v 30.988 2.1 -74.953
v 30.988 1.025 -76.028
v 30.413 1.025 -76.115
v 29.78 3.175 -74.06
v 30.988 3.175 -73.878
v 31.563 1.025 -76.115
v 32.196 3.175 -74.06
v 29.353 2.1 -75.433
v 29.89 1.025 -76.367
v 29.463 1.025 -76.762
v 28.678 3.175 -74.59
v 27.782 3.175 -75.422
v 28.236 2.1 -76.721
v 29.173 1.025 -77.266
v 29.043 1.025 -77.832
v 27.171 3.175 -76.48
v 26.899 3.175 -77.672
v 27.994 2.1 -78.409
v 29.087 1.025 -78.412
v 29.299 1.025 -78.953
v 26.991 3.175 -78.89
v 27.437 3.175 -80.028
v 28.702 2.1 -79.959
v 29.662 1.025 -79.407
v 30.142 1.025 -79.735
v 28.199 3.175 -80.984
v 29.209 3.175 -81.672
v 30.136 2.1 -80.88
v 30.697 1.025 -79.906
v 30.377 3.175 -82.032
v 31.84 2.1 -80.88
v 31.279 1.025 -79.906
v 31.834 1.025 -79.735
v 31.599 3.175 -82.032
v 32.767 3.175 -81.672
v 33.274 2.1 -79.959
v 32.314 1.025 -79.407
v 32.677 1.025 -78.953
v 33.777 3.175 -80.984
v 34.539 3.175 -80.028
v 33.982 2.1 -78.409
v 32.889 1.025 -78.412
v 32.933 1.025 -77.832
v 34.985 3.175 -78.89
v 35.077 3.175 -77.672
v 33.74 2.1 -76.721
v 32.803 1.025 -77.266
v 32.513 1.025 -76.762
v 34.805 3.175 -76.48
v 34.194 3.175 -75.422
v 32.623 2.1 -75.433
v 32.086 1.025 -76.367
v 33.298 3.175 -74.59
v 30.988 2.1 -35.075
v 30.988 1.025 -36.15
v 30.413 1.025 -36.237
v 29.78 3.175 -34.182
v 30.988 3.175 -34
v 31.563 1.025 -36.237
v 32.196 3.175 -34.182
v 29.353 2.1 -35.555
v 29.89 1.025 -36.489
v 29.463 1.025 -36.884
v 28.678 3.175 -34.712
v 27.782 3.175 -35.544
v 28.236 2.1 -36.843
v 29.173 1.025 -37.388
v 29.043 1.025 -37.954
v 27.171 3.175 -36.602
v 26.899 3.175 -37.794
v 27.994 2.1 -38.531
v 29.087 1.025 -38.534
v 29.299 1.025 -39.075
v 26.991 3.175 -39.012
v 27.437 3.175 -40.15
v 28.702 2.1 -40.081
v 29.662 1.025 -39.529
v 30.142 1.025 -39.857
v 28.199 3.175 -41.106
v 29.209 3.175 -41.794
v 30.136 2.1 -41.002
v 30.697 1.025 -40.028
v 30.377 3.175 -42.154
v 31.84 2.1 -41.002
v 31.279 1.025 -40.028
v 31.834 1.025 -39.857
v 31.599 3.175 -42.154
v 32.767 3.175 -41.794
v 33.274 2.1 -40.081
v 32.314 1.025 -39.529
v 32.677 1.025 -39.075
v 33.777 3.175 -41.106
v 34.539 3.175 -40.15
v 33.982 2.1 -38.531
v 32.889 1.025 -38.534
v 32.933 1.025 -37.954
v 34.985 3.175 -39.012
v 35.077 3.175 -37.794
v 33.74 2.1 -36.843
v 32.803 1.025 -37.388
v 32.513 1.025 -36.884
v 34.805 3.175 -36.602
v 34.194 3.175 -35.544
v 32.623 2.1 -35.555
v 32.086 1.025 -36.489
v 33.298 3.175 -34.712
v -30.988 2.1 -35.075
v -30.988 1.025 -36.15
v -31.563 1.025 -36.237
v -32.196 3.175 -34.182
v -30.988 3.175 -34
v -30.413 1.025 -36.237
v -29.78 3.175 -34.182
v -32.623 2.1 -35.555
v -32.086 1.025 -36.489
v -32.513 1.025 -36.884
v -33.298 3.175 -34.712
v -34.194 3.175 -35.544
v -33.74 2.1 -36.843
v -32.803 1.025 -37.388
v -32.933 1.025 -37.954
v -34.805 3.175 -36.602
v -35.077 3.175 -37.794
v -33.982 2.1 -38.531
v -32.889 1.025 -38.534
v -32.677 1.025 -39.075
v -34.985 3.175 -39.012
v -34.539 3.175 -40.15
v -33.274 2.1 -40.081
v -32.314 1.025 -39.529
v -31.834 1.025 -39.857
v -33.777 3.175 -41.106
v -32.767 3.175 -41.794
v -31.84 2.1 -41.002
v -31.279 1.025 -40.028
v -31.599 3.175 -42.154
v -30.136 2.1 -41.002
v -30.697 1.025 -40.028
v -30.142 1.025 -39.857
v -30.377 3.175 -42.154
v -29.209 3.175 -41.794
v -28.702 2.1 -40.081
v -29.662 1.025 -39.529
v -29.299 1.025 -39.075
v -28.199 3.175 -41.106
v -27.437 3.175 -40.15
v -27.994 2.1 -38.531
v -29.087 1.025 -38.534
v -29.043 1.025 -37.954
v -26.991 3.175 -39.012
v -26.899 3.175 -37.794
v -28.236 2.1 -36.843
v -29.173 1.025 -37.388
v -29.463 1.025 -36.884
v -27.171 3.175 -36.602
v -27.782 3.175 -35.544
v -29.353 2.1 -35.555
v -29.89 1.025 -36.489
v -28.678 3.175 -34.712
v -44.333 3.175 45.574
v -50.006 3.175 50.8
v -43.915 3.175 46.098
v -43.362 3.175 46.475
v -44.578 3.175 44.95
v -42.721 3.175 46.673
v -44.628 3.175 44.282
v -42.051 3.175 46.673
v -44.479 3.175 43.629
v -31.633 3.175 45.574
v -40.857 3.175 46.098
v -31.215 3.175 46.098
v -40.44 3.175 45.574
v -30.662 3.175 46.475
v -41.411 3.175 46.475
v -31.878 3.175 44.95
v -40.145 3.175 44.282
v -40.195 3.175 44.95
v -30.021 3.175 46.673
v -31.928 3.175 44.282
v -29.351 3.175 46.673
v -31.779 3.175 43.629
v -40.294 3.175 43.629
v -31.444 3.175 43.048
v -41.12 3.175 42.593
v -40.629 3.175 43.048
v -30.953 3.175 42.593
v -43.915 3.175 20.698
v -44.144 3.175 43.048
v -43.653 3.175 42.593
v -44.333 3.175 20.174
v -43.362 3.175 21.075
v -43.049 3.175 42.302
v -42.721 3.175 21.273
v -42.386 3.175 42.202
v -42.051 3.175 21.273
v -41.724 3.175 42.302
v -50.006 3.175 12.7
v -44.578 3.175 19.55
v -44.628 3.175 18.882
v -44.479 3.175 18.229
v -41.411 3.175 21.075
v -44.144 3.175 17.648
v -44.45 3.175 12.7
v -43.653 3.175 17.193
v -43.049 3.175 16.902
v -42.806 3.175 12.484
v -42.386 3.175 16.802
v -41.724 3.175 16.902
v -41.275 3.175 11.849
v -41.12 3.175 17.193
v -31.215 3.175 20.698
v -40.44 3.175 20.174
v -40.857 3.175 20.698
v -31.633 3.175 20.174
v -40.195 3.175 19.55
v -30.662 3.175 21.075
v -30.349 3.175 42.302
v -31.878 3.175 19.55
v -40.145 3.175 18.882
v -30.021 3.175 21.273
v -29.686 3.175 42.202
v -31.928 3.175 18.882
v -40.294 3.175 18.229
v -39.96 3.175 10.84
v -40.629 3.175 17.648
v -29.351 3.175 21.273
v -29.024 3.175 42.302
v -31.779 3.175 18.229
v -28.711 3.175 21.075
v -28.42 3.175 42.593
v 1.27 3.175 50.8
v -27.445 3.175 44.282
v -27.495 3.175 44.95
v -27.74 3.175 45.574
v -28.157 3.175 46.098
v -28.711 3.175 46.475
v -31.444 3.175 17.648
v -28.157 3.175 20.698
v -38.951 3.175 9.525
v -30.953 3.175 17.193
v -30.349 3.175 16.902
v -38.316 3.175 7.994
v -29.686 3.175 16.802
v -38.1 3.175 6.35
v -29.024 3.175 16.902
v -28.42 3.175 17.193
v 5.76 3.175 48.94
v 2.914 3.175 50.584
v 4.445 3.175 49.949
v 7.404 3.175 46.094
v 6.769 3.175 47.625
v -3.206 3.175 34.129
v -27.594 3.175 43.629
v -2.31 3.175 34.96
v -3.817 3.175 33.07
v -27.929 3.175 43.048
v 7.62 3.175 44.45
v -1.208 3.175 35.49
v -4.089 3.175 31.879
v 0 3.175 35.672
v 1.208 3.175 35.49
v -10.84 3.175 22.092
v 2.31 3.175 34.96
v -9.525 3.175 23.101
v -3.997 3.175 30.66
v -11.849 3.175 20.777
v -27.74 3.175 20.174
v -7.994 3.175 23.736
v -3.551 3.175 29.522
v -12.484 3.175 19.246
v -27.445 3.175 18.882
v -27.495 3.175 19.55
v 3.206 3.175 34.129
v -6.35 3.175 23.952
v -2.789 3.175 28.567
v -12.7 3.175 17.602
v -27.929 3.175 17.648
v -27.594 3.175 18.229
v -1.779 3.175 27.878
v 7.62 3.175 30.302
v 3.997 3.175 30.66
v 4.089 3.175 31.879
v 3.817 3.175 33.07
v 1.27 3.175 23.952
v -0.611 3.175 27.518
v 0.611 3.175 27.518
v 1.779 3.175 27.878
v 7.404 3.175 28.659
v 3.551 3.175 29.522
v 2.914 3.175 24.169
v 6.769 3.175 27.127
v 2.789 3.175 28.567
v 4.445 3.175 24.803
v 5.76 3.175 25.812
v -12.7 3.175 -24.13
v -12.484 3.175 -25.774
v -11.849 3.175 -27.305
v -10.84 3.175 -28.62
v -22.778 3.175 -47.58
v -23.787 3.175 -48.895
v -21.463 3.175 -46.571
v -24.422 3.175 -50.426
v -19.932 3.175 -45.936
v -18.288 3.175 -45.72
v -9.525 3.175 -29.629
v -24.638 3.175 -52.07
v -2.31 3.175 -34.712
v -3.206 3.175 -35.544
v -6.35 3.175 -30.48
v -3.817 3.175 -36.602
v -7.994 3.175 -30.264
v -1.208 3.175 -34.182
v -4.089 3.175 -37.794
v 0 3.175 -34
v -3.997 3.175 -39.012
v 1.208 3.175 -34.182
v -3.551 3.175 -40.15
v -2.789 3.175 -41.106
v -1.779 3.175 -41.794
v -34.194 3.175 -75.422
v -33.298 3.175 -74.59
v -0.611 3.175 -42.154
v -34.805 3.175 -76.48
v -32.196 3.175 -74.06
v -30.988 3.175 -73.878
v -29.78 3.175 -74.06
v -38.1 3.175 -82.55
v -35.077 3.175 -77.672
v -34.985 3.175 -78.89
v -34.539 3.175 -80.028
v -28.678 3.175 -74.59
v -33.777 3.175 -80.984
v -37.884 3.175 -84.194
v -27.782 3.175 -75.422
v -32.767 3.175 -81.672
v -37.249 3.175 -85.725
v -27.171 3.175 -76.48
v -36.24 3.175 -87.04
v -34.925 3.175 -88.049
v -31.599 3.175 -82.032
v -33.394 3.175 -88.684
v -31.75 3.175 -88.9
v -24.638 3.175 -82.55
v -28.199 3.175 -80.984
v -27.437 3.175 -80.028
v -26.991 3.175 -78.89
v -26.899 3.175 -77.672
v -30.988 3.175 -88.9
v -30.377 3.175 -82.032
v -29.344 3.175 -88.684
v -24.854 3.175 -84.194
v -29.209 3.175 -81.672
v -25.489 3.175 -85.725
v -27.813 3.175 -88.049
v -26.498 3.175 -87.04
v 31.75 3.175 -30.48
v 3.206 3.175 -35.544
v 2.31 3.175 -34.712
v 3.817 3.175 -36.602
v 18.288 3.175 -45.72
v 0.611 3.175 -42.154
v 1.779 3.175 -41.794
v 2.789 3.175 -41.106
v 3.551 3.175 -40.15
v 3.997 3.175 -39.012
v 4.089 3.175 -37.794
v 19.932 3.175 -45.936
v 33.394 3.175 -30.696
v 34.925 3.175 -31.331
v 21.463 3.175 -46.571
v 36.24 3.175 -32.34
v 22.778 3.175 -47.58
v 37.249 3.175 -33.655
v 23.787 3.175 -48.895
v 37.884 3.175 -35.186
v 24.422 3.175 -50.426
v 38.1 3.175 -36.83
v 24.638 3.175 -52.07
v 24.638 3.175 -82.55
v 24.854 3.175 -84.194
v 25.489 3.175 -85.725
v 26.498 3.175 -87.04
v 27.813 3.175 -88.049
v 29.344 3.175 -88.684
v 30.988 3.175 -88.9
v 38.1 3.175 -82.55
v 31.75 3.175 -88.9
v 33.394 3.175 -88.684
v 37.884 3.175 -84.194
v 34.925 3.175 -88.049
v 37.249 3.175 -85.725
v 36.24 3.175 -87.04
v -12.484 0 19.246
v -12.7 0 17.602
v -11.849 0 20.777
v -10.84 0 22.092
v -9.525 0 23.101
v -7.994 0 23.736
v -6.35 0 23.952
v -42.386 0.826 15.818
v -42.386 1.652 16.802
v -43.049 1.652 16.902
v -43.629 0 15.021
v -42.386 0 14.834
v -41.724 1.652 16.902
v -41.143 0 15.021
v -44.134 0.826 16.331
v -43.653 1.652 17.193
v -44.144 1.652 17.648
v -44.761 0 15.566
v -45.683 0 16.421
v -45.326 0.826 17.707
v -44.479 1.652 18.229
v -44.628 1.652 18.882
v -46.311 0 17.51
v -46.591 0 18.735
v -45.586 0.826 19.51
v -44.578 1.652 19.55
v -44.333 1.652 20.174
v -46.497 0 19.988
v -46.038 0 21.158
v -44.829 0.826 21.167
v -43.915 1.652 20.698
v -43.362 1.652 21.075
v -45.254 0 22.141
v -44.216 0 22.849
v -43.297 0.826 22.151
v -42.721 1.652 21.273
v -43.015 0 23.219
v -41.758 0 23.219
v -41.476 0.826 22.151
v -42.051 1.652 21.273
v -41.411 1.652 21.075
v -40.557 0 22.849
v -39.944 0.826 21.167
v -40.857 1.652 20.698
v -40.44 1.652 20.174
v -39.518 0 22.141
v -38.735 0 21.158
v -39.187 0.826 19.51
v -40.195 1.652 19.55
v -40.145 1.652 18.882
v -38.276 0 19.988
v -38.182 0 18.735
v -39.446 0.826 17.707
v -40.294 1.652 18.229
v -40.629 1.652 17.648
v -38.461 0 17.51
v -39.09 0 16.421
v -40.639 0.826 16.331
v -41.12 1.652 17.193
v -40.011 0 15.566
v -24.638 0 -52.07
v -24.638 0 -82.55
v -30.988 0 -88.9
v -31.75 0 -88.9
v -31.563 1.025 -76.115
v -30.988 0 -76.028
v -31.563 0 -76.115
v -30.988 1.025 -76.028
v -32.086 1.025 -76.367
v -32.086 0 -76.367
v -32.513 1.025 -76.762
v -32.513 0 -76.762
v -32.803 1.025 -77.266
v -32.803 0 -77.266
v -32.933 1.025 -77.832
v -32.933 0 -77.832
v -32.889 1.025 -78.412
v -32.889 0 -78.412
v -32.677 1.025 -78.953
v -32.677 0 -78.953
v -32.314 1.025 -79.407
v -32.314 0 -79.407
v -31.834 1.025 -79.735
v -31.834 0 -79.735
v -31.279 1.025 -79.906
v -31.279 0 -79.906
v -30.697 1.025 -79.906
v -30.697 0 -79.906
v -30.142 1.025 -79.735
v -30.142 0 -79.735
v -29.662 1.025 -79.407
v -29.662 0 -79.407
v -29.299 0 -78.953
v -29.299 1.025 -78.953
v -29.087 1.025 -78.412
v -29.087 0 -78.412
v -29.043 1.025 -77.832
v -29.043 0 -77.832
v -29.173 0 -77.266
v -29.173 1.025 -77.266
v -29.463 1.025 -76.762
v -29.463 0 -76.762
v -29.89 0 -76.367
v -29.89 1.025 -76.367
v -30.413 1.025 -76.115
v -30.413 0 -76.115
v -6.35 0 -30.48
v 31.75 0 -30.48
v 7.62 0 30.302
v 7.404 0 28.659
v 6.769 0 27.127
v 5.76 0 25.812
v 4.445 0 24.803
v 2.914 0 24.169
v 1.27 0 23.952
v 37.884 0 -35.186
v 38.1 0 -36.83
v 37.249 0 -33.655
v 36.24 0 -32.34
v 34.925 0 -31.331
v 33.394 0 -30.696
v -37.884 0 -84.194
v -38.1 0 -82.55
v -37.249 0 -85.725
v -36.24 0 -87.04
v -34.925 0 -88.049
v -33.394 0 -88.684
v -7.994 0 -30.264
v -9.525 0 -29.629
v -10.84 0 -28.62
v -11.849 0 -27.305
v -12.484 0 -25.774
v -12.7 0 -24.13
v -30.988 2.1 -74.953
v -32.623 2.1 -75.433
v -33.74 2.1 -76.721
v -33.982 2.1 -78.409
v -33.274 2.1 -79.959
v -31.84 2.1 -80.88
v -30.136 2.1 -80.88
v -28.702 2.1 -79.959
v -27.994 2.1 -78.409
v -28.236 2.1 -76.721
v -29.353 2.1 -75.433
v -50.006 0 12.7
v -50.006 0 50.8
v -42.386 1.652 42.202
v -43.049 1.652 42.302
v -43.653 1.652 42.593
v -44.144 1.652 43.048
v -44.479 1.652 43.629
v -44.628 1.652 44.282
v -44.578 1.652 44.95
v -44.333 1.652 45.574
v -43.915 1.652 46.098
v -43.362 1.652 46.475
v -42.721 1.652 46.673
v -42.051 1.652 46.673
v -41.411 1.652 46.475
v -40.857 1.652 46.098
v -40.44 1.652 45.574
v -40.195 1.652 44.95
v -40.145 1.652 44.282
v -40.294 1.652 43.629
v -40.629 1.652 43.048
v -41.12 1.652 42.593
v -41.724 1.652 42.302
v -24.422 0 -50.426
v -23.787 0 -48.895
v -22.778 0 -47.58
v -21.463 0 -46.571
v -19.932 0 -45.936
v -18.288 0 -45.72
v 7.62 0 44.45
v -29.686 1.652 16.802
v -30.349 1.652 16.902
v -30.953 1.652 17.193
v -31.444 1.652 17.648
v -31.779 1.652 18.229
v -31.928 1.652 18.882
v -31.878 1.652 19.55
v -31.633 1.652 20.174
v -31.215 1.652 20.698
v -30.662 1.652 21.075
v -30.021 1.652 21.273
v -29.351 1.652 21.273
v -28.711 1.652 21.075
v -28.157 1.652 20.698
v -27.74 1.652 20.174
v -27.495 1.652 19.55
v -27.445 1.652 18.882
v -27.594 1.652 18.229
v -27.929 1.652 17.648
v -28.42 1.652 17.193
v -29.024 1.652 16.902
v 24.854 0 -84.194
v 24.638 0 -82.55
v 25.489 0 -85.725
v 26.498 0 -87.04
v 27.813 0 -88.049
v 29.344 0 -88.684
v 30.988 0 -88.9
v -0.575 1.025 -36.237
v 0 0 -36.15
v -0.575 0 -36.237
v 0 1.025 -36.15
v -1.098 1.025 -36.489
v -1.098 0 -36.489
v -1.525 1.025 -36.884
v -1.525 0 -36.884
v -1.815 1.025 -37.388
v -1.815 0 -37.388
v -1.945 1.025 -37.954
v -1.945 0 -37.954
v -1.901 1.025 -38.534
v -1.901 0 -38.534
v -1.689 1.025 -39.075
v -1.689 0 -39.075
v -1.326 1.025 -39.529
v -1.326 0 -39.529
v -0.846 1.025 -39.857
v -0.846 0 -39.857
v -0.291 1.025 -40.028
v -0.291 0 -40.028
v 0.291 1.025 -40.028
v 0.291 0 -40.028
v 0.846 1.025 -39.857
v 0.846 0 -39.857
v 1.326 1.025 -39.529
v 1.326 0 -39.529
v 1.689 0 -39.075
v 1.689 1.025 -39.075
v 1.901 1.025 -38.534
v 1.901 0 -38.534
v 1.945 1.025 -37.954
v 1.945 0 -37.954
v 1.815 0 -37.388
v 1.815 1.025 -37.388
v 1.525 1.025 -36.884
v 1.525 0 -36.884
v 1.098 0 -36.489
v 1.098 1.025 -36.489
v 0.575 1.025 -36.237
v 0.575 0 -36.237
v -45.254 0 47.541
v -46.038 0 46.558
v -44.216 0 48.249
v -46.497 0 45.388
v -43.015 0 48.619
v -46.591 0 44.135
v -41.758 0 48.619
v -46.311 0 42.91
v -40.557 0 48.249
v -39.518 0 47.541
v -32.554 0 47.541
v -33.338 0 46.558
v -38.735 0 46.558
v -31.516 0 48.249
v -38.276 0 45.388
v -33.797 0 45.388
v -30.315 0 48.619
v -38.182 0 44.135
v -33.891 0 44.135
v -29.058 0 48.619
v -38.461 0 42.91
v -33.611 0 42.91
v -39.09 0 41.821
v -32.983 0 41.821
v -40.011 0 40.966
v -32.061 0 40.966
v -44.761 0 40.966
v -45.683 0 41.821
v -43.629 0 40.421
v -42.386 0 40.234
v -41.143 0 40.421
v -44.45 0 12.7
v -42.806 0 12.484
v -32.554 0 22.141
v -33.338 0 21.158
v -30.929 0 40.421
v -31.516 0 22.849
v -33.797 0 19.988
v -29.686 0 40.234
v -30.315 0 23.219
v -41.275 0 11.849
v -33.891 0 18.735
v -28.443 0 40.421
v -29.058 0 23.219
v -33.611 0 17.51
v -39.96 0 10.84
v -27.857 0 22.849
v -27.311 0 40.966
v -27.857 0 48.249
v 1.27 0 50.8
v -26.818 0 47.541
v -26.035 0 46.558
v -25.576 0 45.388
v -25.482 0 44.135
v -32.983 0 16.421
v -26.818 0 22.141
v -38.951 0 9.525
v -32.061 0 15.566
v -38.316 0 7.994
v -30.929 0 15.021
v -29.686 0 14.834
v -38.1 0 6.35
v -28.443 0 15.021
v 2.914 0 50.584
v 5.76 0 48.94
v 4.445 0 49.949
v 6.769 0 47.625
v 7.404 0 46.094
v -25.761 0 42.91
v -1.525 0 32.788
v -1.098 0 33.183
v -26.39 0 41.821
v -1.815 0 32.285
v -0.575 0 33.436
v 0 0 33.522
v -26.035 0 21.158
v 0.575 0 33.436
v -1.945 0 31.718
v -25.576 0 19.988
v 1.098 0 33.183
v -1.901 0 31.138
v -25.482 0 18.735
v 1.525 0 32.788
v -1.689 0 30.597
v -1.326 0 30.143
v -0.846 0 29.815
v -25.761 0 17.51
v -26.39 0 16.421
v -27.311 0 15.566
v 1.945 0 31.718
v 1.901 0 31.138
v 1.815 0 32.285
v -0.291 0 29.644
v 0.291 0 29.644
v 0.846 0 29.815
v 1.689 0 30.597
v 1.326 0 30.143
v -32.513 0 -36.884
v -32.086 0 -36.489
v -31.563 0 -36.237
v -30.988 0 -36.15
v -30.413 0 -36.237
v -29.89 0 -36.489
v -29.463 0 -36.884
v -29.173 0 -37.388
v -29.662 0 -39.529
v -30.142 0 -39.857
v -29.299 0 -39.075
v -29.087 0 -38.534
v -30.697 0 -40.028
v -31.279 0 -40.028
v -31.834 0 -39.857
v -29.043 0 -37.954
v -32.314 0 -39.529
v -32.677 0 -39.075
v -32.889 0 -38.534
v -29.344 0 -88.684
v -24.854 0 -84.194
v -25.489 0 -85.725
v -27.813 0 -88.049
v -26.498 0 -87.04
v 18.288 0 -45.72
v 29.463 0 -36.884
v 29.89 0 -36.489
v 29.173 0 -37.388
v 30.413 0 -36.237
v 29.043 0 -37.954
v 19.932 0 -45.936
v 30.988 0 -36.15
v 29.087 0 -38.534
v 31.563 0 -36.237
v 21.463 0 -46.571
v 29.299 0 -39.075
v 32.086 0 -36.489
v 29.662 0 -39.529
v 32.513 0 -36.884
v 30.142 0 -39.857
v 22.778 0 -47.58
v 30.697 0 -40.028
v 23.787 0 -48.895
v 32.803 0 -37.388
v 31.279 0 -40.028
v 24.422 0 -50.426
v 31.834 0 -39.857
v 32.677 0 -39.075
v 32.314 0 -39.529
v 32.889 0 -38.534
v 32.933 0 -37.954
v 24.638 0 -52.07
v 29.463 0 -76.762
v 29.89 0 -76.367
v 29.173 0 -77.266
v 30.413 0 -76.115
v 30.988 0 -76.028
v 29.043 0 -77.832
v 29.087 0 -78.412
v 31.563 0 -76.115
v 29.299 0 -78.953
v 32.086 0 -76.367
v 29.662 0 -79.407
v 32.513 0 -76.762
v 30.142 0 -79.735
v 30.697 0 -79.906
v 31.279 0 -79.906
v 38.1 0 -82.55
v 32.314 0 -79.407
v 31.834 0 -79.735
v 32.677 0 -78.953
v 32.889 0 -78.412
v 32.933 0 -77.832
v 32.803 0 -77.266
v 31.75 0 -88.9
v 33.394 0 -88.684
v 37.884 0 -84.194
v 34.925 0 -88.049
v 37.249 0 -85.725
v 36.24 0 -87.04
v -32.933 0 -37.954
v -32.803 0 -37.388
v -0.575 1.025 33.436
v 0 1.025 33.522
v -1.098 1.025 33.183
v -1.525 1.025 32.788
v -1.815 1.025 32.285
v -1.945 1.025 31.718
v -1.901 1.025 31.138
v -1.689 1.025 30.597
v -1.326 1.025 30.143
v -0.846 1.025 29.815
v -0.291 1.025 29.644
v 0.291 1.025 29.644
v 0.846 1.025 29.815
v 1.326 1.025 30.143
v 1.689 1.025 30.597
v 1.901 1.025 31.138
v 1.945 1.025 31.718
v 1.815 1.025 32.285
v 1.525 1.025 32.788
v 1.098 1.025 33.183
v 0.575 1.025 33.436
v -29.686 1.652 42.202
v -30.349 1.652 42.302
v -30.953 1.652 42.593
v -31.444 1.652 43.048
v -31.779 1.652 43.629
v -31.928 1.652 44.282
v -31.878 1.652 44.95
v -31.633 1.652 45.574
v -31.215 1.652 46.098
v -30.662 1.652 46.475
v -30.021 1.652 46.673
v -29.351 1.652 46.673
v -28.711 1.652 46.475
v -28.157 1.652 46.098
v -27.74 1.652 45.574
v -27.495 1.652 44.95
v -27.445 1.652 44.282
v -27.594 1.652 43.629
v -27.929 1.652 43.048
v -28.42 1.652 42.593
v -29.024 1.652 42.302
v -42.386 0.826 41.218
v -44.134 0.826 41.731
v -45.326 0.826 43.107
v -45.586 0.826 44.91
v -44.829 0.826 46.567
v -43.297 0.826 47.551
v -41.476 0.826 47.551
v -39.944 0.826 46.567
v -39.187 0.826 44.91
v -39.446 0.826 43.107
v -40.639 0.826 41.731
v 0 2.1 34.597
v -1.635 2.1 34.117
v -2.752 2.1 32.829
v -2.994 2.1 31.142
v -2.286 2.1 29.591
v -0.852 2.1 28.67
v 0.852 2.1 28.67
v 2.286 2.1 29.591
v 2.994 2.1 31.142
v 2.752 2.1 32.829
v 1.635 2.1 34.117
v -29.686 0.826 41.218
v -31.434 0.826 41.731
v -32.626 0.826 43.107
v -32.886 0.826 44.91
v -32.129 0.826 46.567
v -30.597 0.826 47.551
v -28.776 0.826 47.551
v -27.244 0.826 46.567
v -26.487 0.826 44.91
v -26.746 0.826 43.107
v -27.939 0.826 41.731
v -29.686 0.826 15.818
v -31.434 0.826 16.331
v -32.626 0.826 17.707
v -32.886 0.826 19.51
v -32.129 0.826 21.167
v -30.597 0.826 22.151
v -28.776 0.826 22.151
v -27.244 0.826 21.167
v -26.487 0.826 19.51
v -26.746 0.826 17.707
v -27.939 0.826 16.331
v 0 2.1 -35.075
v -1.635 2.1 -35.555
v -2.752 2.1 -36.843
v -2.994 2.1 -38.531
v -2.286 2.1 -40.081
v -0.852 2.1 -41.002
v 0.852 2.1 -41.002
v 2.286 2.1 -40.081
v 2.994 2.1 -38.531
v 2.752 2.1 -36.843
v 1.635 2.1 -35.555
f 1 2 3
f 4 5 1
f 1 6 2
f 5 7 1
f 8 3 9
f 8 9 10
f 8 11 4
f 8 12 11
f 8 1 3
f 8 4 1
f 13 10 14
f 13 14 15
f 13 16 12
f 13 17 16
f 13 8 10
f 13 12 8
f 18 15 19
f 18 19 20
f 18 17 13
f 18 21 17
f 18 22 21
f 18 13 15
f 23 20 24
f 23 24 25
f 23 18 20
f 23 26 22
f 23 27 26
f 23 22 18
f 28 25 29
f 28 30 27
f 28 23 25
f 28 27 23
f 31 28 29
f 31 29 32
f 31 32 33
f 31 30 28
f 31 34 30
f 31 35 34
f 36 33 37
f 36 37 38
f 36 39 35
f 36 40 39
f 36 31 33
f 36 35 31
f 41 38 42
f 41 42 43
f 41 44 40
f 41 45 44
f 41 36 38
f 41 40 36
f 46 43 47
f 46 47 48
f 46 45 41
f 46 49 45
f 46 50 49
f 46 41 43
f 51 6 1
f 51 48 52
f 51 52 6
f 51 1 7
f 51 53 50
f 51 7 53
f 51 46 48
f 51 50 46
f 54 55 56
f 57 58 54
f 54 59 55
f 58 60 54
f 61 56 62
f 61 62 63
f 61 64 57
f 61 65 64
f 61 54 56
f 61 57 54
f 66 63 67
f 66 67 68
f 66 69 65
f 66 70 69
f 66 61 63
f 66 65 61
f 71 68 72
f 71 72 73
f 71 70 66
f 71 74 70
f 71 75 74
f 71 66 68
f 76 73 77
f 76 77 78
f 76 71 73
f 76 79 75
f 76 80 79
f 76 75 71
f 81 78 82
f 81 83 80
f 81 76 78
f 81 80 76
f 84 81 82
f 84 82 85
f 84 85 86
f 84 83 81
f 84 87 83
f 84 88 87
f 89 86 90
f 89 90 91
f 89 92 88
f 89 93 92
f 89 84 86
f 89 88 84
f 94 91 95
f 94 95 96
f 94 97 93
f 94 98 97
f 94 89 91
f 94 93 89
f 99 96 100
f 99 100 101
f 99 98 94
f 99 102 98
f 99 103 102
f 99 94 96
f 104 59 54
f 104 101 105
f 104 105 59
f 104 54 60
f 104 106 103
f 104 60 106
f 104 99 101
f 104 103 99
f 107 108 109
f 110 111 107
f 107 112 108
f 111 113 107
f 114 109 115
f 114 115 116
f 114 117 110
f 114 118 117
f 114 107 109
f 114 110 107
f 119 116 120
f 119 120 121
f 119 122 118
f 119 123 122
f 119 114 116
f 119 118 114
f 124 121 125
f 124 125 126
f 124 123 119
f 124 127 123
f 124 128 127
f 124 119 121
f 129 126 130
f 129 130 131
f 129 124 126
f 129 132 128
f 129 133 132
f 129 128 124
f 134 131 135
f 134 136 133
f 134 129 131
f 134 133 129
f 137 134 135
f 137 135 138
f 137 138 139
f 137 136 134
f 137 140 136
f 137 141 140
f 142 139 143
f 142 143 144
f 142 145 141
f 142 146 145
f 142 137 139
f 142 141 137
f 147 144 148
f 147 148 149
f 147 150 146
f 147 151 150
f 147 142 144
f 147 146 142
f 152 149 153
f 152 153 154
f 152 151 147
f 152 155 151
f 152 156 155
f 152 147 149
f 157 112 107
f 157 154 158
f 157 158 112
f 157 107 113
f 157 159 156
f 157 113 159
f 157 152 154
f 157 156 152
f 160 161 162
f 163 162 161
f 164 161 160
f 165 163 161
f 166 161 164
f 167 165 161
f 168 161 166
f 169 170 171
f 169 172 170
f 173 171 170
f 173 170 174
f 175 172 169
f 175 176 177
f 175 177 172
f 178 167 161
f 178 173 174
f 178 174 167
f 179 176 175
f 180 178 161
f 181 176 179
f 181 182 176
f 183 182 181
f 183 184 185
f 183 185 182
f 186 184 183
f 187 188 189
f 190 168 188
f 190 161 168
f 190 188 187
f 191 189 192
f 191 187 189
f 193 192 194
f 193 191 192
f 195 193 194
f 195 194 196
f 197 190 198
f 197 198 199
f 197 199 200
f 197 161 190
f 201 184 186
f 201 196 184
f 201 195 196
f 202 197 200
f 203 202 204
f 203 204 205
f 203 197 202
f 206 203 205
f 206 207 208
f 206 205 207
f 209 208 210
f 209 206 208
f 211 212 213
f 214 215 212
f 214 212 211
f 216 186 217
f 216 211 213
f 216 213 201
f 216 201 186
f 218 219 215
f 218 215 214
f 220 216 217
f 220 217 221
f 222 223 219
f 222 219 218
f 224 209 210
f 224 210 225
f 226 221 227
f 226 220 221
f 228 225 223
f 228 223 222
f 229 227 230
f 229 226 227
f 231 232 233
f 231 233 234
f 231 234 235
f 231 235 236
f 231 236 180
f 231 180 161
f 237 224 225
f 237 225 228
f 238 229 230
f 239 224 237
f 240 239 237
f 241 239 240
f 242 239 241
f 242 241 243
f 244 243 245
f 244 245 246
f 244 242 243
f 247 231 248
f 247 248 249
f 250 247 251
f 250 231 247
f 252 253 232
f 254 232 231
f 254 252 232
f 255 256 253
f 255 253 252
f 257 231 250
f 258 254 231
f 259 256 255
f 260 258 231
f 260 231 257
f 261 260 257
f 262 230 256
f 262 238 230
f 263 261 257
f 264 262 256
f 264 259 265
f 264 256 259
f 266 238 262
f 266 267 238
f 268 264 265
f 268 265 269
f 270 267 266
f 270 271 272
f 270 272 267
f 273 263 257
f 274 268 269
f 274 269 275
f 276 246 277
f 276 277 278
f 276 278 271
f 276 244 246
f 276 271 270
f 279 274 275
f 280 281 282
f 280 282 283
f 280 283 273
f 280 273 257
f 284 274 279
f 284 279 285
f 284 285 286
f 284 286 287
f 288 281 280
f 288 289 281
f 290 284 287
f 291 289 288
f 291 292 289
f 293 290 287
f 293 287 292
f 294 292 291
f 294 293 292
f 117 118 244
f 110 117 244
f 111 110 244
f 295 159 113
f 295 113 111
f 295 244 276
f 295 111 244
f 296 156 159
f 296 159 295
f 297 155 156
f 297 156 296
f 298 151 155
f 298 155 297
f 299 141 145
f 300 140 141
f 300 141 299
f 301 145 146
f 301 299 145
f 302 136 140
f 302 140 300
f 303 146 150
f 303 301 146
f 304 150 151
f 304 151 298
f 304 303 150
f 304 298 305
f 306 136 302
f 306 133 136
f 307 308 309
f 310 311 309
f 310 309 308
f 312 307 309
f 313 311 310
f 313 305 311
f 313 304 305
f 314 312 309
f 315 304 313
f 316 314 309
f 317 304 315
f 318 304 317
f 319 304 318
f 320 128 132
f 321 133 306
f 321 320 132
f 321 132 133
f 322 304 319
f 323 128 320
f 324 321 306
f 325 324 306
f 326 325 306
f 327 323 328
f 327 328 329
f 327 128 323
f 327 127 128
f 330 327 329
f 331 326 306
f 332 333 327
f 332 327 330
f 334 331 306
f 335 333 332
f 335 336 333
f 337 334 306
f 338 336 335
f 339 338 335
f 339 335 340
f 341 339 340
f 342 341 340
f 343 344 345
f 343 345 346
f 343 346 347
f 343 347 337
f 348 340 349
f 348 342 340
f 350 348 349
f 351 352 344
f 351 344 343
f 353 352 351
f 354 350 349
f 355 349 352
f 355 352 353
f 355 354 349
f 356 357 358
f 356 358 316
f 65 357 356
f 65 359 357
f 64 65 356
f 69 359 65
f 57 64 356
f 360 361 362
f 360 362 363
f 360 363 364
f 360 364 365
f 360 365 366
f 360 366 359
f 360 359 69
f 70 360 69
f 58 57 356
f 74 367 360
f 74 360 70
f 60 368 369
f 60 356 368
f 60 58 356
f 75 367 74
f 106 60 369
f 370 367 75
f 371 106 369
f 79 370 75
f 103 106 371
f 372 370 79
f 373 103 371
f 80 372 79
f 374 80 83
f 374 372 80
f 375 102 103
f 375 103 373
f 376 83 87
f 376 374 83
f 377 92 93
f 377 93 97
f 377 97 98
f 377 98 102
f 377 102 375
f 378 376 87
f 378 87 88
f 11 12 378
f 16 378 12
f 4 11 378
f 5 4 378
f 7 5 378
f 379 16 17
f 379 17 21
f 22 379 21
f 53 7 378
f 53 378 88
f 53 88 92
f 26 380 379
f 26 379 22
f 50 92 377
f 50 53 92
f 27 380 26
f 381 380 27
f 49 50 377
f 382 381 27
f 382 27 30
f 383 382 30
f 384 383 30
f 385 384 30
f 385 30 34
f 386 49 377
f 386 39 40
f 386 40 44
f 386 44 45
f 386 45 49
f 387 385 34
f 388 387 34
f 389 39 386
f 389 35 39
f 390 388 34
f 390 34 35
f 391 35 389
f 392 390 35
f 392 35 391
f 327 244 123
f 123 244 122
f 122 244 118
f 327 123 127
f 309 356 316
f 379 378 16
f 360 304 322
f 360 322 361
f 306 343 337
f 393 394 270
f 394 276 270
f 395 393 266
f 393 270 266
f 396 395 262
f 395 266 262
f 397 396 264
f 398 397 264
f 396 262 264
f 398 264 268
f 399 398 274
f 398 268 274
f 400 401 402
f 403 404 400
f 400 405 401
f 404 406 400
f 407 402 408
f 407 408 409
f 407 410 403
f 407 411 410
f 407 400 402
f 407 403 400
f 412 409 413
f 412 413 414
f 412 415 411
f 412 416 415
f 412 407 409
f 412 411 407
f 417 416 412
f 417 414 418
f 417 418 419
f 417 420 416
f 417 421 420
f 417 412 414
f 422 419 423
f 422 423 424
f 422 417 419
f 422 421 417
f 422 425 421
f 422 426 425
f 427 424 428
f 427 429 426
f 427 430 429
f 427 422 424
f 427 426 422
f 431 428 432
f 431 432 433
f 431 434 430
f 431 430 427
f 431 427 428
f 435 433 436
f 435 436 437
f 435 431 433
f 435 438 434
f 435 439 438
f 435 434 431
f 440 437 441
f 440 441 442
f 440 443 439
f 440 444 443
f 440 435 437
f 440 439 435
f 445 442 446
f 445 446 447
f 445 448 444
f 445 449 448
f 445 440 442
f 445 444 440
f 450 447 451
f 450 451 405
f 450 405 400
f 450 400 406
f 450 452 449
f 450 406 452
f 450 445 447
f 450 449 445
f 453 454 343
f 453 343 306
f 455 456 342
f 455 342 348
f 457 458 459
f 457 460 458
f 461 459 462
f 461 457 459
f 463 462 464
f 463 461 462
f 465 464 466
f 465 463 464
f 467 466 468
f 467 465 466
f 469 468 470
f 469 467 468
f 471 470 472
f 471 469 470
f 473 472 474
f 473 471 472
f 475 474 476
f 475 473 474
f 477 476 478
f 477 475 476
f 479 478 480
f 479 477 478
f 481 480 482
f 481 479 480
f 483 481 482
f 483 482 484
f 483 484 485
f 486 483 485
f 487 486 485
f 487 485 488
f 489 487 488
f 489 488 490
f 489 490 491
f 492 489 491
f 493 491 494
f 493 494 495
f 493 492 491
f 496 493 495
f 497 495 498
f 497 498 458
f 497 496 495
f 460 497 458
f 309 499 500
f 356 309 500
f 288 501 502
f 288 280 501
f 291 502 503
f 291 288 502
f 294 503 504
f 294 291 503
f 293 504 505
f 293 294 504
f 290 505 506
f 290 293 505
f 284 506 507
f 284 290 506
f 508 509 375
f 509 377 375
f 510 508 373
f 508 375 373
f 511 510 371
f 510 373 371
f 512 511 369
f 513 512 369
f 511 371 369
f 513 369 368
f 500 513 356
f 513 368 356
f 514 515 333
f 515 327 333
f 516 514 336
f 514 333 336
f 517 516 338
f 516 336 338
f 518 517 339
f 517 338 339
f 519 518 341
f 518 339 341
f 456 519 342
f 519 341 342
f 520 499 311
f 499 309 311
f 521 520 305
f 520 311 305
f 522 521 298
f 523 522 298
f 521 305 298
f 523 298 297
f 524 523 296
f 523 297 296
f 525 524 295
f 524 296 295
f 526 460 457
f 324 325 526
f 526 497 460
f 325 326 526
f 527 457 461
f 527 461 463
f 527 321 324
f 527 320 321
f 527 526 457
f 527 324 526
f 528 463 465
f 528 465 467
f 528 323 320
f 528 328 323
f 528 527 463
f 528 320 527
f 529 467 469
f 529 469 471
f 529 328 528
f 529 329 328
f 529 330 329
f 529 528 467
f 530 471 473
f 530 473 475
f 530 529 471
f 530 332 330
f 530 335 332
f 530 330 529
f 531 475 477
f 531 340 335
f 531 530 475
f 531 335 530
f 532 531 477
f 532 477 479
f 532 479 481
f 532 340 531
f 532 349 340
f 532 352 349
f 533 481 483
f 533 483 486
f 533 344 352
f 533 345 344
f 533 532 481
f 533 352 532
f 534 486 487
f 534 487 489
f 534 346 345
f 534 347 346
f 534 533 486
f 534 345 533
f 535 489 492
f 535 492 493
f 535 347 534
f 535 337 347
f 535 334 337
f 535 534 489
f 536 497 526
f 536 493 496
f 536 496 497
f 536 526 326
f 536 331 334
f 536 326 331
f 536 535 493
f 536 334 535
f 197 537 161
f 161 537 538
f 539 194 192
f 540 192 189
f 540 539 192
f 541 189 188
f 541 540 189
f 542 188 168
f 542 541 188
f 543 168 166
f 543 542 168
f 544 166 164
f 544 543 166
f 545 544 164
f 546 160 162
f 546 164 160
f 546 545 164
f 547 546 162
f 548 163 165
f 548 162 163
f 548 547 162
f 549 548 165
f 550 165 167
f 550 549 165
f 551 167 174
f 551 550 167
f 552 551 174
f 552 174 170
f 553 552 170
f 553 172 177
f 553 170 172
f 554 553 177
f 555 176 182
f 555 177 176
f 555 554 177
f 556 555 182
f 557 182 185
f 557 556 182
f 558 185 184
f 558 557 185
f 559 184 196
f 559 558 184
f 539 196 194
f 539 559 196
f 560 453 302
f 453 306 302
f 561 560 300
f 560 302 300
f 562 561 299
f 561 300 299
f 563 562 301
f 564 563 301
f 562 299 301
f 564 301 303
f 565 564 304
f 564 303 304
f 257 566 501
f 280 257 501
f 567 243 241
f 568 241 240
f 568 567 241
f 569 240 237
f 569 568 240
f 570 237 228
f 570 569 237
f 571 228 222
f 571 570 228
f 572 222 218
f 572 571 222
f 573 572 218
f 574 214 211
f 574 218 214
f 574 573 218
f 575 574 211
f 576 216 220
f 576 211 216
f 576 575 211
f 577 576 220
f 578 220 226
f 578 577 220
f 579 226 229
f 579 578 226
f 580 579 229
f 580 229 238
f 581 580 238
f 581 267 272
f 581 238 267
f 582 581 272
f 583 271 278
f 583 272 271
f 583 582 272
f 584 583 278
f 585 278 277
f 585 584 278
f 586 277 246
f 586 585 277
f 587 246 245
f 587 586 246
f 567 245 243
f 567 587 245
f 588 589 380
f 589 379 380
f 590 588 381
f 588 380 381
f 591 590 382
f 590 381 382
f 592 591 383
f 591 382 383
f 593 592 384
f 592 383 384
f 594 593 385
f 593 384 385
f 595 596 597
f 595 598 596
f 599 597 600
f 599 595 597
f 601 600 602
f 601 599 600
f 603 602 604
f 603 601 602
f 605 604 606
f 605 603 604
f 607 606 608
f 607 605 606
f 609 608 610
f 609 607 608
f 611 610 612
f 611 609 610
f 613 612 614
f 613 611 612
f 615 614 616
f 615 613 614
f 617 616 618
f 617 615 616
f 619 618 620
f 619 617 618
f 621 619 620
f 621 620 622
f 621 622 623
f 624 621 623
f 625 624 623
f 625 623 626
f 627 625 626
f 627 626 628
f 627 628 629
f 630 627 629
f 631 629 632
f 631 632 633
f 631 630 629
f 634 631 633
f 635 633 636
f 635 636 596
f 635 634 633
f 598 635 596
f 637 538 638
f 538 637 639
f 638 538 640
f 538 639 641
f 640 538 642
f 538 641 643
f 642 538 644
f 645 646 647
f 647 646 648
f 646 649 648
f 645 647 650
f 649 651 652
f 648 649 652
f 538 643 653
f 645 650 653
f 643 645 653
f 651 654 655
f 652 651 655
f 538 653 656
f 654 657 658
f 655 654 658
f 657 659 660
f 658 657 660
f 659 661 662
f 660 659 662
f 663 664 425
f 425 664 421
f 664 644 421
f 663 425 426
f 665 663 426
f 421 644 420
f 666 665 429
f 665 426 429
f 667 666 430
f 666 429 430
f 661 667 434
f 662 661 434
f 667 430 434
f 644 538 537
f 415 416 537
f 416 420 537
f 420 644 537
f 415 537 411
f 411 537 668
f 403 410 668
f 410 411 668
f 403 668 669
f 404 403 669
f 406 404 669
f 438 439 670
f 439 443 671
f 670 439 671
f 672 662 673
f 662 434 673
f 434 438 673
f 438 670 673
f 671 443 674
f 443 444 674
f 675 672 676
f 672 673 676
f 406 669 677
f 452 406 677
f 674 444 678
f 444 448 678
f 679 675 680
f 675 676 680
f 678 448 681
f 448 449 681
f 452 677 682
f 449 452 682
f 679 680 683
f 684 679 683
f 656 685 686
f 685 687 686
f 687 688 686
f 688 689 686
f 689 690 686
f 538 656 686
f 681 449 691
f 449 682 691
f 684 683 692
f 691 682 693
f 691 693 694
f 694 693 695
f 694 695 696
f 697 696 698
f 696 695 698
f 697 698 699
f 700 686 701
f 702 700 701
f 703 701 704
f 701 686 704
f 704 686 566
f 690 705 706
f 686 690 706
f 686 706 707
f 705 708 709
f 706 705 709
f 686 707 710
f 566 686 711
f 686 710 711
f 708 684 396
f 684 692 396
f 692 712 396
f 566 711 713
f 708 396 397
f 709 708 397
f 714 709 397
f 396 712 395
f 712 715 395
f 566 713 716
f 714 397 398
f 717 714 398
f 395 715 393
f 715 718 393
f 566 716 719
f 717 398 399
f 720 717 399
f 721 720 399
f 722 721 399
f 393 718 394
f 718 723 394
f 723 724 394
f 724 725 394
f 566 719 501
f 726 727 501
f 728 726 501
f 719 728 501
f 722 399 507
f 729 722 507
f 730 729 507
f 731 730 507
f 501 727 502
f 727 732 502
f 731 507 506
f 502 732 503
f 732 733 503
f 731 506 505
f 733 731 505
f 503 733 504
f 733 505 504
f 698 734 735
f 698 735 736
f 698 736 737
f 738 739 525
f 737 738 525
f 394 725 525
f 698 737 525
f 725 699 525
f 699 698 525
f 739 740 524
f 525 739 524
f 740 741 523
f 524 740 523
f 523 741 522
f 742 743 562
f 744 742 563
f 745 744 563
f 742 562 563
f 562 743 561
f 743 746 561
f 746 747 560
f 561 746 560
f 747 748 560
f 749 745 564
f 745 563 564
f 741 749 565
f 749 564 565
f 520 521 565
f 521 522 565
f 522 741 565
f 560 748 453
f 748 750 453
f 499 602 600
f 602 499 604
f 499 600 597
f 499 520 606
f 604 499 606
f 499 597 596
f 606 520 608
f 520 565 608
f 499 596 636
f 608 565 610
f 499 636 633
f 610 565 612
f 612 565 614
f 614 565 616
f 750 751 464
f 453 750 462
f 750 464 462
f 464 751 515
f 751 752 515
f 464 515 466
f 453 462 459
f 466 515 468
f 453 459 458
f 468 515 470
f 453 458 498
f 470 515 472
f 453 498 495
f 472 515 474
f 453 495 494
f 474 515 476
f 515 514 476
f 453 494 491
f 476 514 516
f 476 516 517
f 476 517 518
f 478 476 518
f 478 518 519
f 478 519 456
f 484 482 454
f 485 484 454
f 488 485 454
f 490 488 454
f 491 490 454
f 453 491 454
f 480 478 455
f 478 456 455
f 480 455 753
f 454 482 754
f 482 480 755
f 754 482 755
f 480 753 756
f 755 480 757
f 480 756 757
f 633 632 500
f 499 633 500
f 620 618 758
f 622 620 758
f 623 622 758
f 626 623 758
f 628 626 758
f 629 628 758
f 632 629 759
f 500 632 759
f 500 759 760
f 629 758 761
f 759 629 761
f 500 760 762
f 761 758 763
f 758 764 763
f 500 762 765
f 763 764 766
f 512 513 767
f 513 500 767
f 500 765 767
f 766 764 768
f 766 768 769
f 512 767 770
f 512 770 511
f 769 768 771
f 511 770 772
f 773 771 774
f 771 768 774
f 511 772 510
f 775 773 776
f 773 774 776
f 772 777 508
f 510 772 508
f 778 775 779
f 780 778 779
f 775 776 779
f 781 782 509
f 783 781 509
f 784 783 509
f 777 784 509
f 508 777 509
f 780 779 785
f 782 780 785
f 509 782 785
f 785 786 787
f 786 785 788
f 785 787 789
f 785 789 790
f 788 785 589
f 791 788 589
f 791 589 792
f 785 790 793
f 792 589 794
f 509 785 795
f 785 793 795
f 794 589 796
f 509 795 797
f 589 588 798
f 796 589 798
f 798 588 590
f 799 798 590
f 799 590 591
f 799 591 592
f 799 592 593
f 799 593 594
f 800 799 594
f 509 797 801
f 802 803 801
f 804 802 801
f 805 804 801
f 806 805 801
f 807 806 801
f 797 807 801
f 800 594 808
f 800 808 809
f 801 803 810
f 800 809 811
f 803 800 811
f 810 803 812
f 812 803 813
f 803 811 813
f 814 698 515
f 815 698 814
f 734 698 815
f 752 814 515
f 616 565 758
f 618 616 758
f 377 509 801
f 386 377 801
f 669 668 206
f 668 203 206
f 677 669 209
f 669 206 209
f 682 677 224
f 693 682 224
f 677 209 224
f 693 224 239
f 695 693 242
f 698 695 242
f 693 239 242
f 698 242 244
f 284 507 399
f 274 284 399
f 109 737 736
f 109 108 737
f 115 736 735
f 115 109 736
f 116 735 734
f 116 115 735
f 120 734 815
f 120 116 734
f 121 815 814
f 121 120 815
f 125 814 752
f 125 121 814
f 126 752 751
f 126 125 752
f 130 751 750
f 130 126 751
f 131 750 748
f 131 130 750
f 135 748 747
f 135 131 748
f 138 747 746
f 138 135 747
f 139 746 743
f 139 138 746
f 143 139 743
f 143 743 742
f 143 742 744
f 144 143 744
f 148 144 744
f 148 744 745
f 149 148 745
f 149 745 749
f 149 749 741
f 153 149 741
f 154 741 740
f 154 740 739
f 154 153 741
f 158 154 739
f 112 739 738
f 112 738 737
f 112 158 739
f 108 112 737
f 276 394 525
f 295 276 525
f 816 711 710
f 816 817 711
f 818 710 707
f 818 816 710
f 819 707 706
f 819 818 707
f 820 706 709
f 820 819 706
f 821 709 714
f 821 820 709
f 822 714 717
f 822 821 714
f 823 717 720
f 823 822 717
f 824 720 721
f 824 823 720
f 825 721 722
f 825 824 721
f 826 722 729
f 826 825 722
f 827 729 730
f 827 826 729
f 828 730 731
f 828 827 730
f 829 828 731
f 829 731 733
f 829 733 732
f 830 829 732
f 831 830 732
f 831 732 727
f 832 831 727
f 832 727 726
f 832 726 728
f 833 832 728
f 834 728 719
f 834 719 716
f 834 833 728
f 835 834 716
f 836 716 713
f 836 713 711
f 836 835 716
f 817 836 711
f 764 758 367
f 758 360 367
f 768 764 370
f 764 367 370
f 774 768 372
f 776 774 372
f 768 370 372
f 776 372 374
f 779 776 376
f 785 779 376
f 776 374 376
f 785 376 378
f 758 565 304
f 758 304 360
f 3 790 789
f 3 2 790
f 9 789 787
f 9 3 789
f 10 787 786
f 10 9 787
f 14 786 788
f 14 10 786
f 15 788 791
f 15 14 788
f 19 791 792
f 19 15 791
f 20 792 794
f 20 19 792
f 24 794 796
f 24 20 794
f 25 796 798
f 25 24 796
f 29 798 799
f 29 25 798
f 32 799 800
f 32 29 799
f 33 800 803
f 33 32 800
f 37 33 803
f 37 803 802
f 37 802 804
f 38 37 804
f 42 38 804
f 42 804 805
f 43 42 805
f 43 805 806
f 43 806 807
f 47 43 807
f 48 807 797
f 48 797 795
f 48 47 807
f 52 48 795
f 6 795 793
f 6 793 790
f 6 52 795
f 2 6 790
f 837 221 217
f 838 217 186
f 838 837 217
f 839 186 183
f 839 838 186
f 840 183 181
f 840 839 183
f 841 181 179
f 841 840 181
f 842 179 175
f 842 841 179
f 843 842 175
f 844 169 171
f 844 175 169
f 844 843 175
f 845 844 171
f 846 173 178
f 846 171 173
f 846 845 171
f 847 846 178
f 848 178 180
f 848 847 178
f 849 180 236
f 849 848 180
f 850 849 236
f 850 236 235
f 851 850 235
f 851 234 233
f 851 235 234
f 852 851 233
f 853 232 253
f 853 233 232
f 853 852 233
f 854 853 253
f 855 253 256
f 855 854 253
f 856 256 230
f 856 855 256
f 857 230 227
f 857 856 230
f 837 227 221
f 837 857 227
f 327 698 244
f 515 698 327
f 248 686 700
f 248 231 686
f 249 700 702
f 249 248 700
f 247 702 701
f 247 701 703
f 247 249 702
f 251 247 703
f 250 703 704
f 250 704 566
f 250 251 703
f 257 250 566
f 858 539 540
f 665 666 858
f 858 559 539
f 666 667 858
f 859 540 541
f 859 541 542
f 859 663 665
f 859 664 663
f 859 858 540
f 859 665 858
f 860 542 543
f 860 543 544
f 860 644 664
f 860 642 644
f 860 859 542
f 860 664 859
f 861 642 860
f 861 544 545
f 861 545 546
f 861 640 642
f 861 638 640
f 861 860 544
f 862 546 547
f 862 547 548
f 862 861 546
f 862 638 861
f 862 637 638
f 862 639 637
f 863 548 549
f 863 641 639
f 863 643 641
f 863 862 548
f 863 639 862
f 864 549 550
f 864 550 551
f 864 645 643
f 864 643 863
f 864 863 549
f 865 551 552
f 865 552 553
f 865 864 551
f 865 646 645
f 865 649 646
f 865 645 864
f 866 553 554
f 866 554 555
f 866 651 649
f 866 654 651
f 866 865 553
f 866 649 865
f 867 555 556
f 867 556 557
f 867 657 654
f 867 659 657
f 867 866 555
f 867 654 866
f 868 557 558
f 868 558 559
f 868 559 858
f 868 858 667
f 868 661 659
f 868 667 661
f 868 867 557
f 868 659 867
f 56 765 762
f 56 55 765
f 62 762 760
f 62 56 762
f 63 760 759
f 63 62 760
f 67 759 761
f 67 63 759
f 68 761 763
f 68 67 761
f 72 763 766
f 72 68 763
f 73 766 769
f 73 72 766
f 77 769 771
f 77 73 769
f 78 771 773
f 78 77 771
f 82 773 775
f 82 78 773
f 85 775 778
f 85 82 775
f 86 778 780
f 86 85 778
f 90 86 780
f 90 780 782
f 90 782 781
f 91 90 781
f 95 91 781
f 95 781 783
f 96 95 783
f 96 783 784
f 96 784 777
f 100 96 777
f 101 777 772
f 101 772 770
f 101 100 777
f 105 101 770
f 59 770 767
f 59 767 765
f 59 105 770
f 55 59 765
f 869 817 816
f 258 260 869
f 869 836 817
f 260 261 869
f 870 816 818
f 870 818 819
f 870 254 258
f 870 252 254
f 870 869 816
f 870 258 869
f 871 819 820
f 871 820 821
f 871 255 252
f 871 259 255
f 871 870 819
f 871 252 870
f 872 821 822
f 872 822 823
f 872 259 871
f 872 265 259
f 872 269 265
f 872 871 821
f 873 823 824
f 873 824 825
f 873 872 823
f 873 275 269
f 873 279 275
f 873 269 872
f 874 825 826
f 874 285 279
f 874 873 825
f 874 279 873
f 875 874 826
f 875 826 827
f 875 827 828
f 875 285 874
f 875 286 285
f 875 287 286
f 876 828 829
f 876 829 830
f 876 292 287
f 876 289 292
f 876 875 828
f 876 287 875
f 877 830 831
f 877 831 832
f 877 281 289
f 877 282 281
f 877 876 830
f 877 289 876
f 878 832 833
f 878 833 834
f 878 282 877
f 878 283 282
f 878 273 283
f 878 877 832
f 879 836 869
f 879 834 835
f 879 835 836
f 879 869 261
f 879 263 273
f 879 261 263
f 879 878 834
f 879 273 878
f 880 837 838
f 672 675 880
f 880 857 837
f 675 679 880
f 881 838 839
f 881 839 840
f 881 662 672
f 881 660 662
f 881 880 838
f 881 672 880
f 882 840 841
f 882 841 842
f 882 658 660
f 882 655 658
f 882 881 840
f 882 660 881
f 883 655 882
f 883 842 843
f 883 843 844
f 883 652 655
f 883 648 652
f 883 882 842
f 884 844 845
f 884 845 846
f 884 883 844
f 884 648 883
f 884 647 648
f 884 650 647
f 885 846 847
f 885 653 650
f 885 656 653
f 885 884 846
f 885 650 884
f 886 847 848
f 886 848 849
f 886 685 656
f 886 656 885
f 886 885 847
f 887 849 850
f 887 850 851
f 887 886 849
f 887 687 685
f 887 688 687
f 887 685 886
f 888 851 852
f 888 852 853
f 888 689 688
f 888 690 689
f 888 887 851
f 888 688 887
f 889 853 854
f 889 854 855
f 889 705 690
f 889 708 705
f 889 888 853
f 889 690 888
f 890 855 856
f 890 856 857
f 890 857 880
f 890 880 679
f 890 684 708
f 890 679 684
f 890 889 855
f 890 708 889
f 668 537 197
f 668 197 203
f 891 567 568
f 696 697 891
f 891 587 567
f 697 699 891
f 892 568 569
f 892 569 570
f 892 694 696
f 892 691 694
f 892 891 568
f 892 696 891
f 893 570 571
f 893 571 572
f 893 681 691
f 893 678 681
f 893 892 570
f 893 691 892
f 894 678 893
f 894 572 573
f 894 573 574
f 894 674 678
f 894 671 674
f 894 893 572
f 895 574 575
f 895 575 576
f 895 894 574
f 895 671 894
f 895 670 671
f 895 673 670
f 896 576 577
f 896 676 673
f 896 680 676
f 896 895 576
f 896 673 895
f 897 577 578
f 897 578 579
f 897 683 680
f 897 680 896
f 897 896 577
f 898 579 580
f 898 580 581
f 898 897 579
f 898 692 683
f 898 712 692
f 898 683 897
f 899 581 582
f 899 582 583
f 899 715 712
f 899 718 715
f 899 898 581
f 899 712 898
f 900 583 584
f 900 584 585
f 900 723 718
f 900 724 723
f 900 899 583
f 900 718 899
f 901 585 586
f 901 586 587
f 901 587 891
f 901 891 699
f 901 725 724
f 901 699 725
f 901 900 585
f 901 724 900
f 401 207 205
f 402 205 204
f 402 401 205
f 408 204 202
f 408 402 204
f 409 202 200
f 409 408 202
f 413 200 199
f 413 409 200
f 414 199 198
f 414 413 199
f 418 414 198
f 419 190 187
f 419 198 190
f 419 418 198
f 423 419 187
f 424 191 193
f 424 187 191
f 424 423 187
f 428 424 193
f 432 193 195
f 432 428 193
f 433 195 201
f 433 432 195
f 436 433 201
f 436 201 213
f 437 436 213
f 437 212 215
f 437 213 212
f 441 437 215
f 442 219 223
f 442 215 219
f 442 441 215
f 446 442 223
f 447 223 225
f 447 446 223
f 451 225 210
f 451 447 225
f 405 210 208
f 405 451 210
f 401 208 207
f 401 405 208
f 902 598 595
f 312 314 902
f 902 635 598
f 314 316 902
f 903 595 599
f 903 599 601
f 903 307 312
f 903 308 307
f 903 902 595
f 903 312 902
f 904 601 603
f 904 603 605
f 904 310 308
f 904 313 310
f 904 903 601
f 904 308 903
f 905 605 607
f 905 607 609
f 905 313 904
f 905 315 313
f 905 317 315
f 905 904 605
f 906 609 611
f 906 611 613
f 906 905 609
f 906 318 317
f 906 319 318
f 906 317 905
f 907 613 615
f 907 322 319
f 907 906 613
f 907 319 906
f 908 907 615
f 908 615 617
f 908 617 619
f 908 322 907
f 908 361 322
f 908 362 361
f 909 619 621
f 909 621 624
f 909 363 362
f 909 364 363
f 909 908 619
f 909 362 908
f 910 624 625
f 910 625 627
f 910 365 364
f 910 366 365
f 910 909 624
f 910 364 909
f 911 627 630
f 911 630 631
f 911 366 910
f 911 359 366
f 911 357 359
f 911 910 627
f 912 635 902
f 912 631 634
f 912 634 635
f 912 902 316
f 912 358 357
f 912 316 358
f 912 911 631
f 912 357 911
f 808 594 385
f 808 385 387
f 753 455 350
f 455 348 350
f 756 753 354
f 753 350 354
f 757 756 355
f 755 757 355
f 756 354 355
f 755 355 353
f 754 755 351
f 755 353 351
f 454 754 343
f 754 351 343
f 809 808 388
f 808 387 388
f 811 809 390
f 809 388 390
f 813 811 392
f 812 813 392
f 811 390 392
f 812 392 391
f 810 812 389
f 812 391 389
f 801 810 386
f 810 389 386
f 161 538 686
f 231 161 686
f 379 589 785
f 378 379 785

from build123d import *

# Parameters (mm, degrees)
SKETCH1_W                                      = 76.2
SKETCH1_H                                      = 177.8
BOSS_EXTRUDE1_DEPTH                            = 3.175
CSK_FOR_M3_5_FLAT_HEAD_MACHINE_SCREW1_AT_COUNT = 2
CSK_FOR_M3_5_FLAT_HEAD_MACHINE_SCREW1_AT_PITCH = 61.976
CSK_FOR_M3_5_FLAT_HEAD_MACHINE_SCREW_2_COUNT   = 2
CSK_FOR_M3_5_FLAT_HEAD_MACHINE_SCREW_2_PITCH   = 73.697214737
CSK_FOR_M3_5_FLAT_HEAD_MACHINE_SCREW_3_COUNT   = 2
CSK_FOR_M3_5_FLAT_HEAD_MACHINE_SCREW_3_PITCH   = 50.50258437
CSK_FOR_M3_5_FLAT_HEAD_MACHINE_SCREW_4_COUNT   = 2
CSK_FOR_M3_5_FLAT_HEAD_MACHINE_SCREW_4_PITCH   = 39.878
CSK_FOR_M3_5_FLAT_HEAD_MACHINE_SCREW_5_COUNT   = 2
CSK_FOR_M3_5_FLAT_HEAD_MACHINE_SCREW_5_PITCH   = 113.848594475
SKETCH7_W                                      = 11.90625
SKETCH7_H                                      = 38.1
BOSS_EXTRUDE2_DEPTH                            = 3.175
CSK_FOR_8_FLAT_HEAD_MACHINE_SCREW_2_COUNT      = 2
CSK_FOR_8_FLAT_HEAD_MACHINE_SCREW_2_PITCH      = 28.398063314
CSK_FOR_8_FLAT_HEAD_MACHINE_SCREW_3_COUNT      = 2
CSK_FOR_8_FLAT_HEAD_MACHINE_SCREW_3_PITCH      = 12.7
CSK_FOR_8_FLAT_HEAD_MACHINE_SCREW_4_COUNT      = 2
CSK_FOR_8_FLAT_HEAD_MACHINE_SCREW_4_PITCH      = 25.4
SKETCH10_W                                     = 76.2
SKETCH10_H                                     = 38.1
CUT_EXTRUDE2_DEPTH                             = 103.048594621
SKETCH11_W                                     = 49.276
SKETCH11_H                                     = 43.18
CUT_EXTRUDE3_DEPTH                             = 103.048594621
CUT_EXTRUDE4_DEPTH                             = 103.048594621
FILLET2_R                                      = 6.35
FILLET3_R                                      = 6.35


with BuildPart() as part:
    # Sketch1 → Boss-Extrude1 (new body)
    with BuildSketch(Plane(origin=(0, 0, 0), x_dir=(1, 0, 0), z_dir=(0, 1, 0))):
        Rectangle(SKETCH1_W, SKETCH1_H)
    extrude(amount=BOSS_EXTRUDE1_DEPTH)

    # Sketch5 → CSK for M3.5 Flat Head Machine Screw1 (revolve, cut)
    with BuildSketch(Plane(origin=(-30.988, 3.175, -77.978), x_dir=(0, 0, 1), z_dir=(1, 0, 0))):
        Polygon((0, 0), (0, 3.175), (1.95, 3.175), (1.95, 2.15), (4.1, 0), align=None)
    csk_for_m3_5_flat_head_machine_screw1 = revolve(axis=Axis((-30.988, 9.525, -77.978), (0, -1, 0)), mode=Mode.SUBTRACT)

    # CSK for M3.5 Flat Head Machine Screw1 at: CSK for M3.5 Flat Head Machine Screw1 ×2
    with Locations(*[(i * CSK_FOR_M3_5_FLAT_HEAD_MACHINE_SCREW1_AT_PITCH, 0, 0) for i in range(1, CSK_FOR_M3_5_FLAT_HEAD_MACHINE_SCREW1_AT_COUNT)]):
        add(csk_for_m3_5_flat_head_machine_screw1, mode=Mode.SUBTRACT)

    # CSK for M3.5 Flat Head Machine Screw 2: CSK for M3.5 Flat Head Machine Screw1 ×2
    with Locations(*[Vector(0.8409544406952484, 0, 0.5411059311030901) * (i * CSK_FOR_M3_5_FLAT_HEAD_MACHINE_SCREW_2_PITCH) for i in range(1, CSK_FOR_M3_5_FLAT_HEAD_MACHINE_SCREW_2_COUNT)]):
        add(csk_for_m3_5_flat_head_machine_screw1, mode=Mode.SUBTRACT)

    # CSK for M3.5 Flat Head Machine Screw 3: CSK for M3.5 Flat Head Machine Screw1 ×2
    with Locations(*[Vector(0.6135923613981475, 0, 0.7896229568812226) * (i * CSK_FOR_M3_5_FLAT_HEAD_MACHINE_SCREW_3_PITCH) for i in range(1, CSK_FOR_M3_5_FLAT_HEAD_MACHINE_SCREW_3_COUNT)]):
        add(csk_for_m3_5_flat_head_machine_screw1, mode=Mode.SUBTRACT)

    # CSK for M3.5 Flat Head Machine Screw 4: CSK for M3.5 Flat Head Machine Screw1 ×2
    with Locations(*[(0, 0, i * CSK_FOR_M3_5_FLAT_HEAD_MACHINE_SCREW_4_PITCH) for i in range(1, CSK_FOR_M3_5_FLAT_HEAD_MACHINE_SCREW_4_COUNT)]):
        add(csk_for_m3_5_flat_head_machine_screw1, mode=Mode.SUBTRACT)

    # CSK for M3.5 Flat Head Machine Screw 5: CSK for M3.5 Flat Head Machine Screw1 ×2
    with Locations(*[Vector(0.27218605677803737, 0, 0.9622446417079302) * (i * CSK_FOR_M3_5_FLAT_HEAD_MACHINE_SCREW_5_PITCH) for i in range(1, CSK_FOR_M3_5_FLAT_HEAD_MACHINE_SCREW_5_COUNT)]):
        add(csk_for_m3_5_flat_head_machine_screw1, mode=Mode.SUBTRACT)

    # Sketch7 → Boss-Extrude2 (add)
    with BuildSketch(Plane.XZ):
        with Locations((-44.053125, 31.75)):
            Rectangle(SKETCH7_W, SKETCH7_H)
    extrude(amount=-BOSS_EXTRUDE2_DEPTH)

    # Sketch8 → CSK for #8 Flat Head Machine Screw (100)1 (revolve, cut)
    with BuildSketch(Plane(origin=(-29.68625, 0, 44.45), x_dir=(0, 0, -1), z_dir=(1, 0, 0))):
        Polygon((0, 0), (0, 3.17505), (2.2479, 3.17505), (2.2479, 1.651767624), (4.2164, 0), align=None)
    csk_for_8_flat_head_machine_screw_100 = revolve(axis=Axis((-29.68625, -6.35, 44.45), (0, 1, 0)), mode=Mode.SUBTRACT)

    # CSK for _8 Flat Head Machine Screw _ 2: CSK for #8 Flat Head Machine Screw (100)1 ×2
    with Locations(*[Vector(-0.44721359549995776, 0, -0.8944271909999161) * (i * CSK_FOR_8_FLAT_HEAD_MACHINE_SCREW_2_PITCH) for i in range(1, CSK_FOR_8_FLAT_HEAD_MACHINE_SCREW_2_COUNT)]):
        add(csk_for_8_flat_head_machine_screw_100, mode=Mode.SUBTRACT)

    # CSK for _8 Flat Head Machine Screw _ 3: CSK for #8 Flat Head Machine Screw (100)1 ×2
    with Locations(*[(-i * CSK_FOR_8_FLAT_HEAD_MACHINE_SCREW_3_PITCH, 0, 0) for i in range(1, CSK_FOR_8_FLAT_HEAD_MACHINE_SCREW_3_COUNT)]):
        add(csk_for_8_flat_head_machine_screw_100, mode=Mode.SUBTRACT)

    # CSK for _8 Flat Head Machine Screw _ 4: CSK for #8 Flat Head Machine Screw (100)1 ×2
    with Locations(*[(0, 0, -i * CSK_FOR_8_FLAT_HEAD_MACHINE_SCREW_4_PITCH) for i in range(1, CSK_FOR_8_FLAT_HEAD_MACHINE_SCREW_4_COUNT)]):
        add(csk_for_8_flat_head_machine_screw_100, mode=Mode.SUBTRACT)

    # Sketch10 → Cut-Extrude2 (cut, through all)
    with BuildSketch(Plane.XZ):
        with Locations((0, 69.85)):
            Rectangle(SKETCH10_W, SKETCH10_H)
    extrude(amount=-CUT_EXTRUDE2_DEPTH, mode=Mode.SUBTRACT)

    # Sketch11 → Cut-Extrude3 (cut, through all)
    with BuildSketch(Plane.XZ):
        with Locations((0, -67.31)):
            Rectangle(SKETCH11_W, SKETCH11_H)
    extrude(amount=-CUT_EXTRUDE3_DEPTH, mode=Mode.SUBTRACT)

    # Sketch12 → Cut-Extrude4 (cut, through all)
    with BuildSketch(Plane.XZ):
        Polygon((7.62, 50.8), (7.62, 23.9522), (-12.7, 23.9522), (-12.7, -30.48), (38.1, -30.48), (38.1, 50.8), align=None)
    extrude(amount=-CUT_EXTRUDE4_DEPTH, mode=Mode.SUBTRACT)

    # Fillet2
    fillet2_edges = [part.edges().sort_by_distance(p)[0] for p in [
        (24.638, 1.5875, -45.72),
        (-24.638, 1.5875, -45.72),
        (38.1, 1.5875, -30.48),
        (-12.7, 1.5875, -30.48),
        (-12.7, 1.5875, 23.9522),
        (7.62, 1.5875, 23.9522),
        (-38.1, 1.5875, 12.7),
    ]]
    fillet(fillet2_edges, radius=FILLET2_R)

    # Fillet3
    fillet3_edges = [part.edges().sort_by_distance(p)[0] for p in [
        (-38.1, 1.5875, -88.9),
        (-24.638, 1.5875, -88.9),
        (24.638, 1.5875, -88.9),
        (38.1, 1.5875, -88.9),
        (7.62, 1.5875, 50.8),
    ]]
    fillet(fillet3_edges, radius=FILLET3_R)


solid = part.part
